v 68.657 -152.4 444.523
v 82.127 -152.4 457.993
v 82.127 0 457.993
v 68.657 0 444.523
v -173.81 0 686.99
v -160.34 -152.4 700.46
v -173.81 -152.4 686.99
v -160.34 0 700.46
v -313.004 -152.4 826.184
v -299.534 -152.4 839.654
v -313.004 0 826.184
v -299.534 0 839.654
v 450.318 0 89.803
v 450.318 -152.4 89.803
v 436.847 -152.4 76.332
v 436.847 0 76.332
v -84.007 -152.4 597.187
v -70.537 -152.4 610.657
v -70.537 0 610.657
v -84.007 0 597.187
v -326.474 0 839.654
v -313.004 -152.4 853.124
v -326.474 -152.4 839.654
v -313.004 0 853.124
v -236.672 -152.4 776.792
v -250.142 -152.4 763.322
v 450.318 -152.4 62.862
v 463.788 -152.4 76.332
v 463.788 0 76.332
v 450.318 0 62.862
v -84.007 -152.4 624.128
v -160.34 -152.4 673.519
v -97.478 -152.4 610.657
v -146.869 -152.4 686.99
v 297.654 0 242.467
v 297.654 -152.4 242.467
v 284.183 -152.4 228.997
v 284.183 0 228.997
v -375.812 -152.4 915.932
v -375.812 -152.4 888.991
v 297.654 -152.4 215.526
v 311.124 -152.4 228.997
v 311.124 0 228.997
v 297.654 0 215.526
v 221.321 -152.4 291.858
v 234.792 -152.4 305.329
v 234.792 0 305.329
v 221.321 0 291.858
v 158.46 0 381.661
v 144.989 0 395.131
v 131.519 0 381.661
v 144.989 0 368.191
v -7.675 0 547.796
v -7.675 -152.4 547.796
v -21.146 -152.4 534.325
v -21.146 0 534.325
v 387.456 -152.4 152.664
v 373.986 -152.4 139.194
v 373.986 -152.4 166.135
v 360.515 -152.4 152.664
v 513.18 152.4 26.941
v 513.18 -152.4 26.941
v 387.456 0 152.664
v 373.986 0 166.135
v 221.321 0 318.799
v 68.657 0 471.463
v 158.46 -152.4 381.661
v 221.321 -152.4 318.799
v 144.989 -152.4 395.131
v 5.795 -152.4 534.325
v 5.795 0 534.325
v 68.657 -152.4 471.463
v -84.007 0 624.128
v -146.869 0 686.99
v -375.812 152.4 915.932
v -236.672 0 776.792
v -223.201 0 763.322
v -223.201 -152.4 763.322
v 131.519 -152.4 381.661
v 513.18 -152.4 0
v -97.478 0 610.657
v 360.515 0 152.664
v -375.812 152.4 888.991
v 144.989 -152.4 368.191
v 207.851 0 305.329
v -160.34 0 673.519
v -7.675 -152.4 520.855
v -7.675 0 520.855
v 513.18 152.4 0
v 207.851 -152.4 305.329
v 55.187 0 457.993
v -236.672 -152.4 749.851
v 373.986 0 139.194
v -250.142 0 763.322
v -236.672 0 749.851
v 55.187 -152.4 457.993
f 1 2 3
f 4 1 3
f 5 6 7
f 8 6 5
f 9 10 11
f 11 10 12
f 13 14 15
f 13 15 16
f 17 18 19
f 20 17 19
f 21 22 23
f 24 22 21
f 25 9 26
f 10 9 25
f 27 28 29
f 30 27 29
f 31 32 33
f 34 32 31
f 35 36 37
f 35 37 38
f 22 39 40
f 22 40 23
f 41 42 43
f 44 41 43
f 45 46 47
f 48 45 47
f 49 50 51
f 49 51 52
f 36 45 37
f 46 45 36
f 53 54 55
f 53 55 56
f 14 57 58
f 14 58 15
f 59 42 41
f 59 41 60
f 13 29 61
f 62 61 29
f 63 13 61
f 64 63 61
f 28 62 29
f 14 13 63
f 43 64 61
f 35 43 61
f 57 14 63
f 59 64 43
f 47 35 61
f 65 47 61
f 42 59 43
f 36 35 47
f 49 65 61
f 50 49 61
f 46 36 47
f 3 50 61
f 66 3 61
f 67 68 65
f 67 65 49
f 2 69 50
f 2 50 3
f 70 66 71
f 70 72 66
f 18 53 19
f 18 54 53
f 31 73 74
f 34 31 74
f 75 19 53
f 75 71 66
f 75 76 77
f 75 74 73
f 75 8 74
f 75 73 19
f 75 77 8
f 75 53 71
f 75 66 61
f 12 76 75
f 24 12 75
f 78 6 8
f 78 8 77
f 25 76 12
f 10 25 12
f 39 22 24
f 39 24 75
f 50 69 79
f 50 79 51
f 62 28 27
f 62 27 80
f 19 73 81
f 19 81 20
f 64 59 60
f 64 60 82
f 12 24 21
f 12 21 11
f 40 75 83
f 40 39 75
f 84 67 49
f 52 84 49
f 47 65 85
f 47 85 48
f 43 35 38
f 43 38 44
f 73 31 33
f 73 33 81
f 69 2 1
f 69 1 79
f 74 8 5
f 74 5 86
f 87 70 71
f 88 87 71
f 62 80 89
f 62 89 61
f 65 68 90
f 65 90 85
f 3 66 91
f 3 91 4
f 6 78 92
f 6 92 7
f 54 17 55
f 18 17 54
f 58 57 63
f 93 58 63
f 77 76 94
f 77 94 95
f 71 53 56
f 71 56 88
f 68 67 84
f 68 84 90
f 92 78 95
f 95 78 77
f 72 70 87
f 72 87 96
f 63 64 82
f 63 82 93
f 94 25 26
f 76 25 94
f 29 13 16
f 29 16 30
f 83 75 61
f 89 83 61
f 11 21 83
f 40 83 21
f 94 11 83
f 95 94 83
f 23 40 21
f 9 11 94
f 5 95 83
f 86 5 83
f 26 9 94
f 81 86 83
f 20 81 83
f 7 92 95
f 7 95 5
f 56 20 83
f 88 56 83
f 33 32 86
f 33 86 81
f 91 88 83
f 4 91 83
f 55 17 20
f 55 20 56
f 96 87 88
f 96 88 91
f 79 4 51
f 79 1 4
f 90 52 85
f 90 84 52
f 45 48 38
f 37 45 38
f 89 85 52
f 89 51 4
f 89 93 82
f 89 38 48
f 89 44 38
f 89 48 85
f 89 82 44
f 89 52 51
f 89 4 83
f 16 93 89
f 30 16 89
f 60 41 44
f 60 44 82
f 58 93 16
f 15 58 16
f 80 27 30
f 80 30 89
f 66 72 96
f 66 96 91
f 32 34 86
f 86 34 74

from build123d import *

# Parameters (mm, degrees)
F1_DEPTH = 152.4
F2_W     = 19.05
F2_H     = 152.4
F3_DEPTH = 19.05


with BuildPart() as f1:
    # F0 (on Front) → F1 (new body, symmetric)
    with BuildSketch(Plane.XZ):
        Polygon((-375.8118146057, 915.9322428123), (-375.8118146057, 888.9914744491), (513.1796598434, 0), (513.1796598434, 26.9407683632), align=None)
    extrude(amount=F1_DEPTH, both=True)

    # F2 (on face) → F3 (cut)
    with BuildSketch(Plane(origin=(270.0602141033, 0, 270.0602141033), x_dir=(0.7071067812, 0, -0.7071067812), z_dir=(0.7071067812, 0, 0.7071067812))):
        with Locations((264.4478174423, -76.2)):
            Rectangle(F2_W, F2_H)
        with Locations((156.4978174423, -76.2)):
            Rectangle(F2_W, F2_H)
        with Locations((48.5478174423, -76.2)):
            Rectangle(F2_W, F2_H)
        with Locations((-59.4021825577, -76.2)):
            Rectangle(F2_W, F2_H)
        with Locations((-167.3521825577, -76.2)):
            Rectangle(F2_W, F2_H)
        with Locations((-275.3021825577, -76.2)):
            Rectangle(F2_W, F2_H)
        with Locations((-383.2521825577, -76.2)):
            Rectangle(F2_W, F2_H)
        with Locations((-491.2021825577, -76.2)):
            Rectangle(F2_W, F2_H)
        with Locations((-599.1521825577, -76.2)):
            Rectangle(F2_W, F2_H)
        with Locations((-707.1021825577, -76.2)):
            Rectangle(F2_W, F2_H)
        with Locations((-815.0521825577, -76.2)):
            Rectangle(F2_W, F2_H)
    extrude(amount=-F3_DEPTH, mode=Mode.SUBTRACT)


solid = f1.part
